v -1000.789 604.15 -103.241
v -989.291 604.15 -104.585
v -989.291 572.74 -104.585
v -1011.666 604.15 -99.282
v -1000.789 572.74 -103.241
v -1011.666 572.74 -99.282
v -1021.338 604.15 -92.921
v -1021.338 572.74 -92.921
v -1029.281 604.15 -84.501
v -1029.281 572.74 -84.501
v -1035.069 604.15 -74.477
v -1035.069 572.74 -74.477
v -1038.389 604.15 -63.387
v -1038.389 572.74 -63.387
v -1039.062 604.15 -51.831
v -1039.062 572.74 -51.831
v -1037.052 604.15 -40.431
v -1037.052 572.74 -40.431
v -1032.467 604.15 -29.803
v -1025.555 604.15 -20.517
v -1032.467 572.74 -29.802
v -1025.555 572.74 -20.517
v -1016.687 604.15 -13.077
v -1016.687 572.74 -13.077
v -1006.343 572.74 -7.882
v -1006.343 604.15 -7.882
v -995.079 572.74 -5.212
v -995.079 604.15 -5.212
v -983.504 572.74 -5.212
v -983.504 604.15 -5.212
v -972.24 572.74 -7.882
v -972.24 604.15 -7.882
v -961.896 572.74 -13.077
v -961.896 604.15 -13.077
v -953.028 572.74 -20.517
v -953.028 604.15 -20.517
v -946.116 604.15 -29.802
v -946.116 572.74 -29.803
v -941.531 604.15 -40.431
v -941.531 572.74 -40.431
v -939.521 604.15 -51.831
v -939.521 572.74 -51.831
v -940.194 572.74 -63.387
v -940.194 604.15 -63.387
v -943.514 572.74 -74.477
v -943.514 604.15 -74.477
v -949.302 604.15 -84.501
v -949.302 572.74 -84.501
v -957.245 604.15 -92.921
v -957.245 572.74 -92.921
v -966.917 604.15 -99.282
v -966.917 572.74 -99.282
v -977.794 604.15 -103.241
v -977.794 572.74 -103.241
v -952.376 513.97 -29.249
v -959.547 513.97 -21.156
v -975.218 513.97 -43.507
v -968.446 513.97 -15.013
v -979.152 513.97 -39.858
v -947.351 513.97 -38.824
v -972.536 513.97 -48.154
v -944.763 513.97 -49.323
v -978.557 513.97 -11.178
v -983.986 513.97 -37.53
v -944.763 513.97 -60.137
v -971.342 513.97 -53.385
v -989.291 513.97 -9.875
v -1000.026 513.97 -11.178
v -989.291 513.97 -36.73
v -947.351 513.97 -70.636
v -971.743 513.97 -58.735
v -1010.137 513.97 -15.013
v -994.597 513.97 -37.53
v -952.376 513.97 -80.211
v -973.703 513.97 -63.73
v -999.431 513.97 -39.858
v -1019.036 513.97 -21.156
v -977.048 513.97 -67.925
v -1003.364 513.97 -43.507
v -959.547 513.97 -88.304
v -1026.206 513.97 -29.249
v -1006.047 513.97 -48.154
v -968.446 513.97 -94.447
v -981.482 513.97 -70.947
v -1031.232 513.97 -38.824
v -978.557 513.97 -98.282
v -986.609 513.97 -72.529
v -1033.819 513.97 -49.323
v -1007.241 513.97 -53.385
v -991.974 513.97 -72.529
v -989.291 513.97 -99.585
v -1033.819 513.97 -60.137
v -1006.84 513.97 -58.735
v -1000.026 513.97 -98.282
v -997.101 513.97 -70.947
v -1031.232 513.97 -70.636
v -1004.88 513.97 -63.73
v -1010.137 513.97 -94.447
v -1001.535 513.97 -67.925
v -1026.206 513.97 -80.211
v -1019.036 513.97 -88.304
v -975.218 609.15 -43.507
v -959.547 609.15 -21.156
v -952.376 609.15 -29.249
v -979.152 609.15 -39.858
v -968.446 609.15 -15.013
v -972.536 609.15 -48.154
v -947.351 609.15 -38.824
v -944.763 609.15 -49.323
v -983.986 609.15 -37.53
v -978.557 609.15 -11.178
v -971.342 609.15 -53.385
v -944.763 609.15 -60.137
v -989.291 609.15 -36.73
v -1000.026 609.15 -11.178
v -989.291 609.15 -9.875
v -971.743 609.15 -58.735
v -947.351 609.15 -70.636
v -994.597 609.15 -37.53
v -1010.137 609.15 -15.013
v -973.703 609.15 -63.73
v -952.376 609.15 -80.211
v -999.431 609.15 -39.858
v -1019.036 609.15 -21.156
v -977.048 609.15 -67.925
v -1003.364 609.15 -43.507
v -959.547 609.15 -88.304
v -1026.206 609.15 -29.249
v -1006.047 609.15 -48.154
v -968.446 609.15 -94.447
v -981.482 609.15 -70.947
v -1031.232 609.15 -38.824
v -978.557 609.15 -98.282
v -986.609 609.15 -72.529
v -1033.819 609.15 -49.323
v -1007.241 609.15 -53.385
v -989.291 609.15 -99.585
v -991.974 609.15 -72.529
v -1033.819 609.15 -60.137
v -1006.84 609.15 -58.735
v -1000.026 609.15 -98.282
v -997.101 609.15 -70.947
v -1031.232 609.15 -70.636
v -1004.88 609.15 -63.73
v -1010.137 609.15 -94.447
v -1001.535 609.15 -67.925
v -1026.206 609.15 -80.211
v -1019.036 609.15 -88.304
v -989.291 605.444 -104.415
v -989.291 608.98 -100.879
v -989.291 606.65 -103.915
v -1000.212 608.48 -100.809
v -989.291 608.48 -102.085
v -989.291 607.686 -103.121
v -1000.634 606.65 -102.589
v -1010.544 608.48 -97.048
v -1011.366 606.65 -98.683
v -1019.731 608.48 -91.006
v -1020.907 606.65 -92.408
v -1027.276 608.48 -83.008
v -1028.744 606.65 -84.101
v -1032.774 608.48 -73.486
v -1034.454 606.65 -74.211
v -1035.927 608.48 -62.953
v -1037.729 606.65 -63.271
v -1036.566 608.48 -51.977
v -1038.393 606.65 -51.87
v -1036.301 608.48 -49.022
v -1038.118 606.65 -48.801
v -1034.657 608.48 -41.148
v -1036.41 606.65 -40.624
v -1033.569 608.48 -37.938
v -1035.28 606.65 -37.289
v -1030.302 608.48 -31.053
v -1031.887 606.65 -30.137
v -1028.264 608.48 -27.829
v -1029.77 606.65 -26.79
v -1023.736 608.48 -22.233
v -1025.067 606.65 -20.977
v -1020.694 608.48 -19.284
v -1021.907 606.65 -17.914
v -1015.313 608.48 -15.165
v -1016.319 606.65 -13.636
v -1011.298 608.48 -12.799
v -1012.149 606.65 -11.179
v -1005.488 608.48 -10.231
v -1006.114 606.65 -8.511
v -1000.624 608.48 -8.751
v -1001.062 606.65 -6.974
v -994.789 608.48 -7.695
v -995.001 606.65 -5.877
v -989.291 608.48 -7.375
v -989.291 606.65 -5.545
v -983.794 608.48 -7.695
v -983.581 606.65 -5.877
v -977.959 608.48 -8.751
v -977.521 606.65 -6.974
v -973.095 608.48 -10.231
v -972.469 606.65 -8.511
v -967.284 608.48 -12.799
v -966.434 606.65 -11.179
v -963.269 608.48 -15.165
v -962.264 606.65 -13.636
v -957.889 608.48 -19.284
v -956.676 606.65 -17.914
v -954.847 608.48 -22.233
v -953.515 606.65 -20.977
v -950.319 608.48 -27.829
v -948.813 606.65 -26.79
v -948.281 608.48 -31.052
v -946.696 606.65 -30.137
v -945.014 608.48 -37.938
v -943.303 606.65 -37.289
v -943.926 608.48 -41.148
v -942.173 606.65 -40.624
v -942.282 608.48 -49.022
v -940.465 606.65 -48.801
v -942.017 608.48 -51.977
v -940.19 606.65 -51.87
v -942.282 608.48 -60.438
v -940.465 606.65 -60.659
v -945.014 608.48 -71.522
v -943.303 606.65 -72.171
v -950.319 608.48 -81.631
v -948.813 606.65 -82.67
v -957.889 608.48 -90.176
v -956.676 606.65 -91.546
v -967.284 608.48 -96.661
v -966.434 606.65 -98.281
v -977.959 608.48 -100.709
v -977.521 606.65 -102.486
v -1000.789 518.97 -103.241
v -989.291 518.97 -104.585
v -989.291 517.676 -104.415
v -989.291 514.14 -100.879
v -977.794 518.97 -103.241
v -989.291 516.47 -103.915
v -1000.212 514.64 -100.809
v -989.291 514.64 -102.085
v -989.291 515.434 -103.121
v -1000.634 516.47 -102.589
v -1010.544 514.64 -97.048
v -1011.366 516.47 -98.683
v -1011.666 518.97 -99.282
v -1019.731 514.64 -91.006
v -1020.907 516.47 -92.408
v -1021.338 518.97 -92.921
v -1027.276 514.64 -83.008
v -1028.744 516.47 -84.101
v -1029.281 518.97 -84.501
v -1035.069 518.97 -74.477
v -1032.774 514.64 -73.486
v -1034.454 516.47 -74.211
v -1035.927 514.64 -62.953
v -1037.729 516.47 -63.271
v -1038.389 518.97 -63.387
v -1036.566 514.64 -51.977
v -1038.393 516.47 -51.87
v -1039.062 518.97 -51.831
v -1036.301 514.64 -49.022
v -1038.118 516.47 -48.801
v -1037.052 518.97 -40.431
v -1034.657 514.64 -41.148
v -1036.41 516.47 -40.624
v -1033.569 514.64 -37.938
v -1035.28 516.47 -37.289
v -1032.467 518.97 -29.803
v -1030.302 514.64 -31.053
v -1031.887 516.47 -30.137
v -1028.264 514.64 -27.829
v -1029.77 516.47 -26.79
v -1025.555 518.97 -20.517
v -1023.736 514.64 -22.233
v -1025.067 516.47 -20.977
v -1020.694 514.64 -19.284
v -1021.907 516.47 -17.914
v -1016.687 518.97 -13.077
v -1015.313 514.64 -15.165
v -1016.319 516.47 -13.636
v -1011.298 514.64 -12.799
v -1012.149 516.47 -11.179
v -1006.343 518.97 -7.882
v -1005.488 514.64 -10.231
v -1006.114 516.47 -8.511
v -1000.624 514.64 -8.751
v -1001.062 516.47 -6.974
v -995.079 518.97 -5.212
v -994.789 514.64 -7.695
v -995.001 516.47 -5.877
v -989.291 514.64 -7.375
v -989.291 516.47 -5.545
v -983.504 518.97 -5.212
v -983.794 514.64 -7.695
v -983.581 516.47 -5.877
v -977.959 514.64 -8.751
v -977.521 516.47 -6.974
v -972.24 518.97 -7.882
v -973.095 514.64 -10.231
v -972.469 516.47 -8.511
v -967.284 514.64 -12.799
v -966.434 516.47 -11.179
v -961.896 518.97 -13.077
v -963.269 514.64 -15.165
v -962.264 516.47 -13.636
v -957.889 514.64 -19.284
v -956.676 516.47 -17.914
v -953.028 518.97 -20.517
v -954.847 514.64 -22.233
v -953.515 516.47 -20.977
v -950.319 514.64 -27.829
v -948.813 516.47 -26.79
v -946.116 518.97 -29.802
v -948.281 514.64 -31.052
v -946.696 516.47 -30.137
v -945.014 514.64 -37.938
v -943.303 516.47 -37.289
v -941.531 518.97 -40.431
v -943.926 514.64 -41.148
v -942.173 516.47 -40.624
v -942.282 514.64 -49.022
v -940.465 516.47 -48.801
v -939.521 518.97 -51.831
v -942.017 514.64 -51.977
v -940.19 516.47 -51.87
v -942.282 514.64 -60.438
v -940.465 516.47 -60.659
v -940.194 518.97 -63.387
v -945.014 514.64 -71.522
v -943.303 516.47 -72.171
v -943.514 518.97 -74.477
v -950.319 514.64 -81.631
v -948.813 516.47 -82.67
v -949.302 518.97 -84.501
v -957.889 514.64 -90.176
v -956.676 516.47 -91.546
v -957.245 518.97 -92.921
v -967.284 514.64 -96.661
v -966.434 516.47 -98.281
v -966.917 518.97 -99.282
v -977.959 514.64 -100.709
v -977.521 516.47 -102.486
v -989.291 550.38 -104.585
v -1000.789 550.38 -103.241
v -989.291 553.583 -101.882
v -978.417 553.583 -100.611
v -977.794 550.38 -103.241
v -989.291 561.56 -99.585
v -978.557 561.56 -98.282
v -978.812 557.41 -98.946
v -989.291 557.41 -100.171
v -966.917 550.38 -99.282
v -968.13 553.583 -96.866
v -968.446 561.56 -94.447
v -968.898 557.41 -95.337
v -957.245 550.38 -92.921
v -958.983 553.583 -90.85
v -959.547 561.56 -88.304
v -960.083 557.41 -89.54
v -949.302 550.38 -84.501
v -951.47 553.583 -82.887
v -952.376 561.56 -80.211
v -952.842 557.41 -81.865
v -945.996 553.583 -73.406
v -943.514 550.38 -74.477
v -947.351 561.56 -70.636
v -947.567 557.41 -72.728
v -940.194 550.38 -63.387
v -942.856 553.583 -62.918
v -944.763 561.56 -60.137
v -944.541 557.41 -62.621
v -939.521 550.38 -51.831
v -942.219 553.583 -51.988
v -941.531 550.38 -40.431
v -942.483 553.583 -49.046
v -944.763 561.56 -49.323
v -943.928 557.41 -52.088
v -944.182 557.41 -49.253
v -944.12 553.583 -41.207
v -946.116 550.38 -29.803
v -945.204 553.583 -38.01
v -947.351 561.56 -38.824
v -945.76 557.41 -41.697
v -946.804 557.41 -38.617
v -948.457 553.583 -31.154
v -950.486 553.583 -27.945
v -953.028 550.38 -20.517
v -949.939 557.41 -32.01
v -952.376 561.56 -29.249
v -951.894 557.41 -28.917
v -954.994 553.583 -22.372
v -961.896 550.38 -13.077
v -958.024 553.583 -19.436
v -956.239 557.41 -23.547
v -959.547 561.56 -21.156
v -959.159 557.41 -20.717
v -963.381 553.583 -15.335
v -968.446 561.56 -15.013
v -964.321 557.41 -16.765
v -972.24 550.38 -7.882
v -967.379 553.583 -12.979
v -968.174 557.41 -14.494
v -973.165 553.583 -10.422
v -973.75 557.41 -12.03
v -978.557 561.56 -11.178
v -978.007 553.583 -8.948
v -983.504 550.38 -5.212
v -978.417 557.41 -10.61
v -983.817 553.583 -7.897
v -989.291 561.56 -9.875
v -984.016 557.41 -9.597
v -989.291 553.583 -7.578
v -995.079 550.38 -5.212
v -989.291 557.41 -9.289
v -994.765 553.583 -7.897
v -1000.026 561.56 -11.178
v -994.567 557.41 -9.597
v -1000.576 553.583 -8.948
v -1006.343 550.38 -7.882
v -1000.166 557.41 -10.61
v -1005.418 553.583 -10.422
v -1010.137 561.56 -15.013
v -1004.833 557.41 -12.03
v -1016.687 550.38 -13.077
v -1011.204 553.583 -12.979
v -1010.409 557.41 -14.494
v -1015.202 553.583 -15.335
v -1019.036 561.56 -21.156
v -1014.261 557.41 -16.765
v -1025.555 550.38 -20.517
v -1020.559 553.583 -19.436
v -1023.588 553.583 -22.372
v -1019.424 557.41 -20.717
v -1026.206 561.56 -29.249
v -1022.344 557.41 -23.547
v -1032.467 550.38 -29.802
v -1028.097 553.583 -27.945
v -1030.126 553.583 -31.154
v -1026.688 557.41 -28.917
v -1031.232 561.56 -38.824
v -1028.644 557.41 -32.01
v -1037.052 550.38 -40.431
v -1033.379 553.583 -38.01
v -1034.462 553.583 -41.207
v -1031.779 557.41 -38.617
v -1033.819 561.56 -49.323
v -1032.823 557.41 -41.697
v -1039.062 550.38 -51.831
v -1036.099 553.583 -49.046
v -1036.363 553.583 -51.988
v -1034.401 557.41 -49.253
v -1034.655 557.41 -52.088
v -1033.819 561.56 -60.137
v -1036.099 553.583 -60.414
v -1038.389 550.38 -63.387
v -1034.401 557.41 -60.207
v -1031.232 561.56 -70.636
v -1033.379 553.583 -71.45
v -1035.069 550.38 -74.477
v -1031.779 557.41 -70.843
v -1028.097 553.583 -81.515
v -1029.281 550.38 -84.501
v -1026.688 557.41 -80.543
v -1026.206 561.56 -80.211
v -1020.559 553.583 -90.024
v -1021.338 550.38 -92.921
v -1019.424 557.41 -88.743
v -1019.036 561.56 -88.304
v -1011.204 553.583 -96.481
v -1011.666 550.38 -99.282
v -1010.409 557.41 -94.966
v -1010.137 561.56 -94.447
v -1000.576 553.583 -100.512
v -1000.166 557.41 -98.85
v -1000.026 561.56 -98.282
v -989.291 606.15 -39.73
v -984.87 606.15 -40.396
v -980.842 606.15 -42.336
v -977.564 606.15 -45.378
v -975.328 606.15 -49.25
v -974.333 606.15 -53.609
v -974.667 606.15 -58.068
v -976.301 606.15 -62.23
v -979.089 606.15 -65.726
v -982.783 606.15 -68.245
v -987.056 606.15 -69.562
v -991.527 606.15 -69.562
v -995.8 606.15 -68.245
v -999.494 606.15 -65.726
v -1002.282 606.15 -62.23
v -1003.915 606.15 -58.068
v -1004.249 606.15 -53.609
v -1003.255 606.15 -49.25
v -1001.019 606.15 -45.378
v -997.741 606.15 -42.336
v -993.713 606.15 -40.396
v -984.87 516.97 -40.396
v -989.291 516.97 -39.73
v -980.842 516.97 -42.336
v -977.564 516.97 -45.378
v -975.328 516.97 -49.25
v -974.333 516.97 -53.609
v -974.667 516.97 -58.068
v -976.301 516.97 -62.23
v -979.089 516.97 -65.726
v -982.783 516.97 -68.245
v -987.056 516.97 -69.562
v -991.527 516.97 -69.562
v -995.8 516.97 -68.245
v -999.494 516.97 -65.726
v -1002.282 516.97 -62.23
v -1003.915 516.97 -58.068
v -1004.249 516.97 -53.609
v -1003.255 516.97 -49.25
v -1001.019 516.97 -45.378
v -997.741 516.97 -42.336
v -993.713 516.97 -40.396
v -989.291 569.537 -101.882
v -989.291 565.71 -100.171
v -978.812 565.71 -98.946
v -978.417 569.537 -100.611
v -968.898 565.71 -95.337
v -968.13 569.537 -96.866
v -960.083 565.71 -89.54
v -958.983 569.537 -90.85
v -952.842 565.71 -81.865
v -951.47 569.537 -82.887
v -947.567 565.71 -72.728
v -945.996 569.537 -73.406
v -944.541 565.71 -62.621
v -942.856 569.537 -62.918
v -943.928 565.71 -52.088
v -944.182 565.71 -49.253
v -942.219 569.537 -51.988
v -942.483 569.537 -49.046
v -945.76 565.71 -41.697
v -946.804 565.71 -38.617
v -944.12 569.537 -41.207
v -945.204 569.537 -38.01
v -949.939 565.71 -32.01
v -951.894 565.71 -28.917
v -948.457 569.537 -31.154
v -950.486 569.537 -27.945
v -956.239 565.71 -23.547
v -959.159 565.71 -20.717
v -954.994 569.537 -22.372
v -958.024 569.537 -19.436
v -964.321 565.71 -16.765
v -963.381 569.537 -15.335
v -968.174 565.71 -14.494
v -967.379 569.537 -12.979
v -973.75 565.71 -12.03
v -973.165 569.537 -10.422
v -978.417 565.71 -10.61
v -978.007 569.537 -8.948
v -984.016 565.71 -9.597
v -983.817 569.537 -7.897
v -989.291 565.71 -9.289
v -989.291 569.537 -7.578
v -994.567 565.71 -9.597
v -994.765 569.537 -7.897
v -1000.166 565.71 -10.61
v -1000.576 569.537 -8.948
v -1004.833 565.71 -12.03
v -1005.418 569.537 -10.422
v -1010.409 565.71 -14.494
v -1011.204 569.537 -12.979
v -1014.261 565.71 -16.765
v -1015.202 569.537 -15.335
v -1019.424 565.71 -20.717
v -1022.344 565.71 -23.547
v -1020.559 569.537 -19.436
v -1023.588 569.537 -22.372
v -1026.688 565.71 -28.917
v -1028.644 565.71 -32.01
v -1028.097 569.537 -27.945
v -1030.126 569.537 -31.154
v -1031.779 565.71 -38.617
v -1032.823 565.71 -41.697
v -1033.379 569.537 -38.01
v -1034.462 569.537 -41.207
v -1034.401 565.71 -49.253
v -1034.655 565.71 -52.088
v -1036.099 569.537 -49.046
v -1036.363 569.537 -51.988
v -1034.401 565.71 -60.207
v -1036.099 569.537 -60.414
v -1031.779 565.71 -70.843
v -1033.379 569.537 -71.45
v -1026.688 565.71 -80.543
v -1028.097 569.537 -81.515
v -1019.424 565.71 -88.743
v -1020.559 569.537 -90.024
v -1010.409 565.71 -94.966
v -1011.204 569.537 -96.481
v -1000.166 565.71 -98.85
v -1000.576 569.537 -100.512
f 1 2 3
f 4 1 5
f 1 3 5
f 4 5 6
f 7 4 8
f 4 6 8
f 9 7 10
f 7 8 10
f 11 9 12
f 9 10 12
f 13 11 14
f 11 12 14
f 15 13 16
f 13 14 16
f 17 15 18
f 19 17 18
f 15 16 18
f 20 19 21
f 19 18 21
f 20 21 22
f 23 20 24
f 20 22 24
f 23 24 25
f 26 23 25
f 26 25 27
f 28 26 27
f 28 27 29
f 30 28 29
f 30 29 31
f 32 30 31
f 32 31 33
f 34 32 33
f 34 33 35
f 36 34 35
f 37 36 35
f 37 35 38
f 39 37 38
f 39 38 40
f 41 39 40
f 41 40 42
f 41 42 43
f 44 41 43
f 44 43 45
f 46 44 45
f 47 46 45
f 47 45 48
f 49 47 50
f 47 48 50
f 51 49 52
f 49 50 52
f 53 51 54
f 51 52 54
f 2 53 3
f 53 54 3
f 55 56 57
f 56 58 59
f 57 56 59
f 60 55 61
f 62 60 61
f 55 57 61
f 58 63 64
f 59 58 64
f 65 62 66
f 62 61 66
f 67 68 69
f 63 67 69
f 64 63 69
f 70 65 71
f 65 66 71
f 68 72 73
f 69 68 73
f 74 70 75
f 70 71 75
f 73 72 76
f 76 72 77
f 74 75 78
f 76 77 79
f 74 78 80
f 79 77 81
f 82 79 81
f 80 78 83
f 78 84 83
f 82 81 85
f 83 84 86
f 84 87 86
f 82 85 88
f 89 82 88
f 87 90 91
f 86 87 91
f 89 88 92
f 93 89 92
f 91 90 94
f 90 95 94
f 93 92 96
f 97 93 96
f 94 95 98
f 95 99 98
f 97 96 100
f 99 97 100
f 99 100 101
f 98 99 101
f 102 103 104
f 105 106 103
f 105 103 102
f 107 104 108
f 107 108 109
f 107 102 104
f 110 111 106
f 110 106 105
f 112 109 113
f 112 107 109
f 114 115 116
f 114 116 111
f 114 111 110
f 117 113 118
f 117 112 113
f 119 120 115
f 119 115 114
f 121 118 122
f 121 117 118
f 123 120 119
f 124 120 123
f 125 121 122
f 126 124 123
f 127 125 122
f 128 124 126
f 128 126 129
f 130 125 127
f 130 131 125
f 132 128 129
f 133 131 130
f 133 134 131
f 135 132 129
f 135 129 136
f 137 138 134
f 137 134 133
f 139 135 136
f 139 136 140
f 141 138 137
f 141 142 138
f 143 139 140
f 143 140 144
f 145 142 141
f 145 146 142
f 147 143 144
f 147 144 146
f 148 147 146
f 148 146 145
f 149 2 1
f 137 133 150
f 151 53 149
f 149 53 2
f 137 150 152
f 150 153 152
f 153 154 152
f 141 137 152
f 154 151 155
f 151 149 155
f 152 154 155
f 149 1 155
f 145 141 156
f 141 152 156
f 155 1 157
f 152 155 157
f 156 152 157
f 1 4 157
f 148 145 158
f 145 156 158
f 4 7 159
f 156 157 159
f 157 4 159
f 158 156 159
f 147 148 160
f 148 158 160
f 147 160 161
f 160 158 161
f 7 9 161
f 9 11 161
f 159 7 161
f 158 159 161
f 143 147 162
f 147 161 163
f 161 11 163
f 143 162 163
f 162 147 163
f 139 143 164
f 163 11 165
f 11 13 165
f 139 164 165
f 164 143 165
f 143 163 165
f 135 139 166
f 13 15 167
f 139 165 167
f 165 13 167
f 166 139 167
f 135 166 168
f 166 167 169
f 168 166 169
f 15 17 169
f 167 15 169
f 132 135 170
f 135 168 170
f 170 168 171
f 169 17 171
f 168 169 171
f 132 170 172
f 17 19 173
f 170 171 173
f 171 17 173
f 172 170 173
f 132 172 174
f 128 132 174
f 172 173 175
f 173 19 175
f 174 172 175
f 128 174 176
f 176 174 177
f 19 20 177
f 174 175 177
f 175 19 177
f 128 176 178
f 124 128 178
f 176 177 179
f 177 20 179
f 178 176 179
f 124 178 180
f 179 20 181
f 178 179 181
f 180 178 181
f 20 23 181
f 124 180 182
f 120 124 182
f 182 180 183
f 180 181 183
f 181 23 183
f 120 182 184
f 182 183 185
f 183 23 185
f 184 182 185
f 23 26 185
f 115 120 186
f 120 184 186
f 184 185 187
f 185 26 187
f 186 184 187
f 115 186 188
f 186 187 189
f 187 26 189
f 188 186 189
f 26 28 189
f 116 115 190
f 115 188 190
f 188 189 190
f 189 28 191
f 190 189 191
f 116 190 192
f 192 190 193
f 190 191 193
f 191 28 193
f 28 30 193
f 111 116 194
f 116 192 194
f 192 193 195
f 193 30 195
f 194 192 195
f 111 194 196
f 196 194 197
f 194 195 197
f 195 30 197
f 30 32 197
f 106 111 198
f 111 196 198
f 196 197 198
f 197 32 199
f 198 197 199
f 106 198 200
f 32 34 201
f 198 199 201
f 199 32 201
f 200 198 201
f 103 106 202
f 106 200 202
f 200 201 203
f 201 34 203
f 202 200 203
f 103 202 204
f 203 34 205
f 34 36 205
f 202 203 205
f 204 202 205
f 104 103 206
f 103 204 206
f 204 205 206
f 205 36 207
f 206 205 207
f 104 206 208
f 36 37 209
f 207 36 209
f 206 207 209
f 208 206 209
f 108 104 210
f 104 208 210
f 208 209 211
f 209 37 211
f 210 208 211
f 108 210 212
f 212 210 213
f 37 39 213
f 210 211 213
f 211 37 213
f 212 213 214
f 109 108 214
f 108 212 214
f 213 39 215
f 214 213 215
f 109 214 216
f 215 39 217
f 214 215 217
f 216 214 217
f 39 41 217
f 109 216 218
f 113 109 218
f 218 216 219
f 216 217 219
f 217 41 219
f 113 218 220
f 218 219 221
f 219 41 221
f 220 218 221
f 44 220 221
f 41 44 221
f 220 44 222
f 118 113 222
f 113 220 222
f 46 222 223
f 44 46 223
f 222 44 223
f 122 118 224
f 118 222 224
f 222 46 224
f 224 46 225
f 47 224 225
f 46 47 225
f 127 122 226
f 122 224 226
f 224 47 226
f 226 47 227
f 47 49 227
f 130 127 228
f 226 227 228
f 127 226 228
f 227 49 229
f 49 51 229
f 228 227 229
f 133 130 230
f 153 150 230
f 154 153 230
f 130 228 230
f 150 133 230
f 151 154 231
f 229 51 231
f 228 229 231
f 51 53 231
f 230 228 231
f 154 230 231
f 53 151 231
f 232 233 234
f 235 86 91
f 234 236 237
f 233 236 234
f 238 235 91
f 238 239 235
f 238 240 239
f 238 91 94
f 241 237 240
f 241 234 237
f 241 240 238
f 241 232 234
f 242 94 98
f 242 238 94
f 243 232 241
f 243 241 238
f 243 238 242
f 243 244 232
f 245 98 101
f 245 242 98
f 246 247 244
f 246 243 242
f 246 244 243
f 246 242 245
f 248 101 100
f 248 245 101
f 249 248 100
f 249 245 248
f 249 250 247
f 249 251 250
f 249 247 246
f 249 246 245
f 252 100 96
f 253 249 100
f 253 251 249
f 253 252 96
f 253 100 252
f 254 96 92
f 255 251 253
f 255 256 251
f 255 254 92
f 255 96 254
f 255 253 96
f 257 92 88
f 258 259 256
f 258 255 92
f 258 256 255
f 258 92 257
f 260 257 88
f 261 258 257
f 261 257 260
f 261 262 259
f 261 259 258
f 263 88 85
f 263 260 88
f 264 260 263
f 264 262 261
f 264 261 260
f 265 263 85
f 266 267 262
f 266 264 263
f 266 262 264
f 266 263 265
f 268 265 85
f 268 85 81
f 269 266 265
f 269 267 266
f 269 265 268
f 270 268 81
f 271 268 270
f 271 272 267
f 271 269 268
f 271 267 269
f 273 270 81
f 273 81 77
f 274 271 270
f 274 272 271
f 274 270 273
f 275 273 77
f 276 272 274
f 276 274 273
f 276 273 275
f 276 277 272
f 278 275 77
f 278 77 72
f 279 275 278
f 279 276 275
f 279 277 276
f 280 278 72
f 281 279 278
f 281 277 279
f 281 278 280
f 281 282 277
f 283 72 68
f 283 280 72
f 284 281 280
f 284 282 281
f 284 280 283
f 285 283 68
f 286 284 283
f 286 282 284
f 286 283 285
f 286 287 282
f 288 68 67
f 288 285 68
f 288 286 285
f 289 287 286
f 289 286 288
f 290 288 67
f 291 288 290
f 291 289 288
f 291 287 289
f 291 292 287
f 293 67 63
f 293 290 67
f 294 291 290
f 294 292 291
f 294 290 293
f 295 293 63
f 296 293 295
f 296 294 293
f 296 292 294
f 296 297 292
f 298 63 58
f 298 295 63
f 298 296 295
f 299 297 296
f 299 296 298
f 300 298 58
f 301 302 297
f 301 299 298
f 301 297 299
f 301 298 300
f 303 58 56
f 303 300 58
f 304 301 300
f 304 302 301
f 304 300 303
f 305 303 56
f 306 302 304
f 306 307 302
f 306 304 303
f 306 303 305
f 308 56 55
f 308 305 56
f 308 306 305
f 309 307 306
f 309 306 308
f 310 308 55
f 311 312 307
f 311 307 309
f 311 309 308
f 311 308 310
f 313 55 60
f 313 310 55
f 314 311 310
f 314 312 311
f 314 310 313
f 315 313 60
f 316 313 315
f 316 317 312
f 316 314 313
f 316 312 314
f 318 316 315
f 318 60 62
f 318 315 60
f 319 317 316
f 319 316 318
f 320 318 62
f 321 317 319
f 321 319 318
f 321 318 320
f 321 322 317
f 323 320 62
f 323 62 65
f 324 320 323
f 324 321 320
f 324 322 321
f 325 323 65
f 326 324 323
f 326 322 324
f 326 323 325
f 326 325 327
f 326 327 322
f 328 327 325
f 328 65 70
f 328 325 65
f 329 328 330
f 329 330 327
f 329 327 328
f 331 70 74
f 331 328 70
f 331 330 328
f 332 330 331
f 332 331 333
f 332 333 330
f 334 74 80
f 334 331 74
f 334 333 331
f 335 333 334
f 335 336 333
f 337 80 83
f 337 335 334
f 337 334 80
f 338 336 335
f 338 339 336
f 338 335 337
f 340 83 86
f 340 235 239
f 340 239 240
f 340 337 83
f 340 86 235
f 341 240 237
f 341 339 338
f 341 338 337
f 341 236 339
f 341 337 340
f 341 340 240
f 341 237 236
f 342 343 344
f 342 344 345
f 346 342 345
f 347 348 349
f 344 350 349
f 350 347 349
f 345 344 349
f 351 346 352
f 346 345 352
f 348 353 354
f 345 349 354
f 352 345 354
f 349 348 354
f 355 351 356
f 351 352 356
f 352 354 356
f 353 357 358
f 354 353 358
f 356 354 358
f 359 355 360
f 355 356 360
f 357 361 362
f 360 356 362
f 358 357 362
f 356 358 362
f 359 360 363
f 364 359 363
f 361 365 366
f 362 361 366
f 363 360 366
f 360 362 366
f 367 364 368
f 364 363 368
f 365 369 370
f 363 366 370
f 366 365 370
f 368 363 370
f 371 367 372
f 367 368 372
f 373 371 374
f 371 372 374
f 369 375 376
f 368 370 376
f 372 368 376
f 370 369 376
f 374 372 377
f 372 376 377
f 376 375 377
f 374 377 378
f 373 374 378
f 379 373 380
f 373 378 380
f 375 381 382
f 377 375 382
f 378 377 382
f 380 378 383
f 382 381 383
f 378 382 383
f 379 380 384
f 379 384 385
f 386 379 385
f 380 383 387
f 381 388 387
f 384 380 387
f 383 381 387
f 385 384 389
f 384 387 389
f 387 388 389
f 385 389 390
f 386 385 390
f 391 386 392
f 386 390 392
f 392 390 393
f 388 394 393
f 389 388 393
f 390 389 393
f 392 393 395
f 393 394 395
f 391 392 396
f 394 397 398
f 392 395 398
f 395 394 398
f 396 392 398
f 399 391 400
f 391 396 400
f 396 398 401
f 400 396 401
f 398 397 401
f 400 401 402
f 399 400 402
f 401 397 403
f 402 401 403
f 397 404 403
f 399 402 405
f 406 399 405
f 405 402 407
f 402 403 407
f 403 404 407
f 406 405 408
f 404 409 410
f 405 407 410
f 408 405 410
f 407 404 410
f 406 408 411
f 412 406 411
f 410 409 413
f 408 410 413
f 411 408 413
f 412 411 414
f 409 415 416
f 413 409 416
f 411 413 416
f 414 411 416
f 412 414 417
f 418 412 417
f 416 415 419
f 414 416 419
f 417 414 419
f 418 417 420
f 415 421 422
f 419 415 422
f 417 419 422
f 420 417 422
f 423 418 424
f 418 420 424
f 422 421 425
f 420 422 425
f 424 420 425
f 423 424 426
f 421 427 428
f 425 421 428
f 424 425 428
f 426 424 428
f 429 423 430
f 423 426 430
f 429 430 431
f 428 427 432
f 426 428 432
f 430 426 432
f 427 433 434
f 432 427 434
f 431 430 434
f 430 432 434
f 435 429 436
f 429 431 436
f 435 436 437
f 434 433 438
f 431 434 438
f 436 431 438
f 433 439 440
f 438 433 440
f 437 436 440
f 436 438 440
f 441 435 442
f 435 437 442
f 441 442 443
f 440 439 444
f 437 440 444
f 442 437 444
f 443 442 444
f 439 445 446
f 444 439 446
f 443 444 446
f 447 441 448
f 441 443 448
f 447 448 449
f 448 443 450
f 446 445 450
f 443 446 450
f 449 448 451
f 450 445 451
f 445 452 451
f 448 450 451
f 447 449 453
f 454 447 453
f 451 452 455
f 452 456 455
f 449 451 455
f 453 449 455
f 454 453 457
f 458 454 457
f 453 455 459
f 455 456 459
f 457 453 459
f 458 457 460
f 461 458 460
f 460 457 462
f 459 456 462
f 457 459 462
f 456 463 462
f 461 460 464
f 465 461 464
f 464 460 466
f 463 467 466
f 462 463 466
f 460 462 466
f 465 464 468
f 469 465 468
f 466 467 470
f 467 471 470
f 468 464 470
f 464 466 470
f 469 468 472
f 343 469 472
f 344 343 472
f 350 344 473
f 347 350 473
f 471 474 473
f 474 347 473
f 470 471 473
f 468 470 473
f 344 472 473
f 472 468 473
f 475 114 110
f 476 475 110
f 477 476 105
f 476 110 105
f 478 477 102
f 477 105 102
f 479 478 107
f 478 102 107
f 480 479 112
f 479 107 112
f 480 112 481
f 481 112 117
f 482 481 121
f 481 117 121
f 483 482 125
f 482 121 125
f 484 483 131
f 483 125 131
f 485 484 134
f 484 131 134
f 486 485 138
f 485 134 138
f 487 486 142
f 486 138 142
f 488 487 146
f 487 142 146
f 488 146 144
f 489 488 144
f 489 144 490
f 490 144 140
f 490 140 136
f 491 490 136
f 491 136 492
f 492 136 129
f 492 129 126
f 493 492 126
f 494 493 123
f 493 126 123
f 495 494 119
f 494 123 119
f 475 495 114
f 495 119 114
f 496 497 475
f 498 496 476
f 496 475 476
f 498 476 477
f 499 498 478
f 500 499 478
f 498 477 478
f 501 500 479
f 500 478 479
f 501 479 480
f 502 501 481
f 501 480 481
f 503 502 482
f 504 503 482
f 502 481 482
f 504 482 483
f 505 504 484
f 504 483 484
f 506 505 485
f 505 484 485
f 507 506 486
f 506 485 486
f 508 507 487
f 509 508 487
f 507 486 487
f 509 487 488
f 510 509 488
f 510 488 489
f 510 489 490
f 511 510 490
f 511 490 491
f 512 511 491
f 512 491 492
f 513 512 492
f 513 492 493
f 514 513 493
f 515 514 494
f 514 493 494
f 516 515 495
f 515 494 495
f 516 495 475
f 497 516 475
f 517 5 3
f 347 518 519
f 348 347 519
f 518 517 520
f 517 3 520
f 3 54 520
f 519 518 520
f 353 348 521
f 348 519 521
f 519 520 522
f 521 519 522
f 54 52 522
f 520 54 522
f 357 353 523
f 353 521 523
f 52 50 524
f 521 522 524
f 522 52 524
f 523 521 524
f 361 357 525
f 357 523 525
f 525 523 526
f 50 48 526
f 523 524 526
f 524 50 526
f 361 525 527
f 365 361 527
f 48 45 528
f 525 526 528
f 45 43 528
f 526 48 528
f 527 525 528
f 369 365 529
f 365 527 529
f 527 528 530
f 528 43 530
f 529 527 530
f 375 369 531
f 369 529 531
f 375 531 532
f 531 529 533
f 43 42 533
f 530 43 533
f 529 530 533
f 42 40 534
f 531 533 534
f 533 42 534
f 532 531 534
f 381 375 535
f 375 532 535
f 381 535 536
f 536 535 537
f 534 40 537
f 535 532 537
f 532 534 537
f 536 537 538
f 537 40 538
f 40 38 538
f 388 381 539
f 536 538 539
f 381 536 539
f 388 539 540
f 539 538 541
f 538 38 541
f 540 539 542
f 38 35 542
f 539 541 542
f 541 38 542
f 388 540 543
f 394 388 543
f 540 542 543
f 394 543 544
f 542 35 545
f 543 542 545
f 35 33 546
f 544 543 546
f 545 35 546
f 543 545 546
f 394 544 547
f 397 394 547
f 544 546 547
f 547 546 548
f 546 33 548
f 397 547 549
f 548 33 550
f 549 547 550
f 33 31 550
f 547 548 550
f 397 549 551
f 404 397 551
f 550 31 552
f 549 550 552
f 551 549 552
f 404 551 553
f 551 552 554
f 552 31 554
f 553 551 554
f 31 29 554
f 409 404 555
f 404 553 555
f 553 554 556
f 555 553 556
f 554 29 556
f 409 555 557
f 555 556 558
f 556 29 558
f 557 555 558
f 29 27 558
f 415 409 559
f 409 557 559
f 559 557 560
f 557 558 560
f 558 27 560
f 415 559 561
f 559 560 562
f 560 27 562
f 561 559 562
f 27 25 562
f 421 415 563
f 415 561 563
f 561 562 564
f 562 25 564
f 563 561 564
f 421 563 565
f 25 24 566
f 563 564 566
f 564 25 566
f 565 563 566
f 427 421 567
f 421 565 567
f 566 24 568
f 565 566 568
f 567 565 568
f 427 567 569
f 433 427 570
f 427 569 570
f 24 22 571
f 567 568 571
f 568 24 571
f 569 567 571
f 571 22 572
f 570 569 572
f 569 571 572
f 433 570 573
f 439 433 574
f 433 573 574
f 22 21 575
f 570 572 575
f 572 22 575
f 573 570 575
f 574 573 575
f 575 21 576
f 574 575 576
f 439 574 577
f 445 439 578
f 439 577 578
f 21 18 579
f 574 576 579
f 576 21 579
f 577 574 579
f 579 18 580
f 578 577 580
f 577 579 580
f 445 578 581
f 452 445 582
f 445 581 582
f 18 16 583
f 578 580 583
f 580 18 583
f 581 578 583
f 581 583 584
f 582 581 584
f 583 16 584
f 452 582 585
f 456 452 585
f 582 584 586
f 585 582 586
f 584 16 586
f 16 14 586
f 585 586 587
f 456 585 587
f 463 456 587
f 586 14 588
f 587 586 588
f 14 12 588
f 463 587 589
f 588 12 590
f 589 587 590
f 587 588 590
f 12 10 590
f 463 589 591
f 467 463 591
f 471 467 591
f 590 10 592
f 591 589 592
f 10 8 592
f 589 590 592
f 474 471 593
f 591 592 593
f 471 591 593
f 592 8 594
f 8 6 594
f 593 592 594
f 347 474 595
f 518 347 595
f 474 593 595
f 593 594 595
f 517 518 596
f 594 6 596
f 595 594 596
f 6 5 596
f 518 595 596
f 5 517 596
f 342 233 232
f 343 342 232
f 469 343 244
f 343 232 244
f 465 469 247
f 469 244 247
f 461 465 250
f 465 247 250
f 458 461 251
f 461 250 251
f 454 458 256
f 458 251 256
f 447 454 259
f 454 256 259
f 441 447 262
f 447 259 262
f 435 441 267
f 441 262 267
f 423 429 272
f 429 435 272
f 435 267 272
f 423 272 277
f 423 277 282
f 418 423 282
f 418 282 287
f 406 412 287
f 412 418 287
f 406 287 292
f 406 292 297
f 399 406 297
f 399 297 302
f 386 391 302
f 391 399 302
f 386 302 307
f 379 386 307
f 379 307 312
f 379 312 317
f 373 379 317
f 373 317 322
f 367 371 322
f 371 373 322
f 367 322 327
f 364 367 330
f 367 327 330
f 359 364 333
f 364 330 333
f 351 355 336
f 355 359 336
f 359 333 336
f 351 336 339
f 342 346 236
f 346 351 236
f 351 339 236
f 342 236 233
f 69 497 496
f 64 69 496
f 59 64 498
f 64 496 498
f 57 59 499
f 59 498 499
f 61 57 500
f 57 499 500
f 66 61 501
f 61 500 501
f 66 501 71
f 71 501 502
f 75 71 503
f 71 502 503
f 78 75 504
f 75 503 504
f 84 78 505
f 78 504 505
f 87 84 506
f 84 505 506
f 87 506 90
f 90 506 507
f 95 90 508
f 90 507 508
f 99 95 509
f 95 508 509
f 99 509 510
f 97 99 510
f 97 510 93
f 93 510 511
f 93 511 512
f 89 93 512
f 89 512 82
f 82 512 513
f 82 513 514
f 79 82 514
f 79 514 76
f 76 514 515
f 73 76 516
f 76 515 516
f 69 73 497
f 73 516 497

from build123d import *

# Parameters (mm, degrees)
SKETCH_1_R          = 49.855
EXTRUDE_1_DEPTH     = 95.18
SKETCH_3_R          = 15
SKETCH_4_R          = 15
CUT_EXTRUDE_1_DEPTH = 250
CHAMFER_1_SIZE      = 3
FILLET_1_R          = 5


with BuildPart() as part:
    # 草图1 → 凸台-拉伸1 (new body)
    with BuildSketch(Plane(origin=(0, 513.97, 0), x_dir=(1, 0, 0), z_dir=(0, 1, 0))):
        with Locations(Location((-989.291415846, 54.73, 0), (0, 0, 90))):
            Circle(SKETCH_1_R)
    extrude(amount=EXTRUDE_1_DEPTH)

    # 草图3 → 切除-旋转1 (revolve, cut)
    with BuildSketch(Plane.XY.offset(-54.73), mode=Mode.PRIVATE) as cut_revolve_1_sk:
        with Locations((-1049.146415846, 561.56)):
            Circle(SKETCH_3_R)
    revolve(cut_revolve_1_sk.sketch.rotate(Axis((-989.291415846, 609.15, -54.73), (0, -1, 0)), 90), axis=Axis((-989.291415846, 609.15, -54.73), (0, -1, 0)), mode=Mode.SUBTRACT)

    # 草图4 → 切除-拉伸1 (cut, symmetric)
    with BuildSketch(Plane(origin=(0, 609.15, 0), x_dir=(1, 0, 0), z_dir=(0, 1, 0))):
        with Locations(Location((-989.291415846, 54.73, 0), (0, 0, 270))):
            Circle(SKETCH_4_R)
    extrude(amount=CUT_EXTRUDE_1_DEPTH, both=True, mode=Mode.SUBTRACT)

    # 倒角1
    chamfer_1_edges = [part.edges().sort_by_distance(p)[0] for p in [
        (-989.291415846, 609.15, -69.73),
        (-989.291415846, 513.97, -69.73),
    ]]
    chamfer(chamfer_1_edges, length=CHAMFER_1_SIZE)

    # 圆角1
    fillet_1_edges = [part.edges().sort_by_distance(p)[0] for p in [
        (-989.291415846, 513.97, -4.875),
        (-989.291415846, 609.15, -4.875),
    ]]
    fillet(fillet_1_edges, radius=FILLET_1_R)


solid = part.part
